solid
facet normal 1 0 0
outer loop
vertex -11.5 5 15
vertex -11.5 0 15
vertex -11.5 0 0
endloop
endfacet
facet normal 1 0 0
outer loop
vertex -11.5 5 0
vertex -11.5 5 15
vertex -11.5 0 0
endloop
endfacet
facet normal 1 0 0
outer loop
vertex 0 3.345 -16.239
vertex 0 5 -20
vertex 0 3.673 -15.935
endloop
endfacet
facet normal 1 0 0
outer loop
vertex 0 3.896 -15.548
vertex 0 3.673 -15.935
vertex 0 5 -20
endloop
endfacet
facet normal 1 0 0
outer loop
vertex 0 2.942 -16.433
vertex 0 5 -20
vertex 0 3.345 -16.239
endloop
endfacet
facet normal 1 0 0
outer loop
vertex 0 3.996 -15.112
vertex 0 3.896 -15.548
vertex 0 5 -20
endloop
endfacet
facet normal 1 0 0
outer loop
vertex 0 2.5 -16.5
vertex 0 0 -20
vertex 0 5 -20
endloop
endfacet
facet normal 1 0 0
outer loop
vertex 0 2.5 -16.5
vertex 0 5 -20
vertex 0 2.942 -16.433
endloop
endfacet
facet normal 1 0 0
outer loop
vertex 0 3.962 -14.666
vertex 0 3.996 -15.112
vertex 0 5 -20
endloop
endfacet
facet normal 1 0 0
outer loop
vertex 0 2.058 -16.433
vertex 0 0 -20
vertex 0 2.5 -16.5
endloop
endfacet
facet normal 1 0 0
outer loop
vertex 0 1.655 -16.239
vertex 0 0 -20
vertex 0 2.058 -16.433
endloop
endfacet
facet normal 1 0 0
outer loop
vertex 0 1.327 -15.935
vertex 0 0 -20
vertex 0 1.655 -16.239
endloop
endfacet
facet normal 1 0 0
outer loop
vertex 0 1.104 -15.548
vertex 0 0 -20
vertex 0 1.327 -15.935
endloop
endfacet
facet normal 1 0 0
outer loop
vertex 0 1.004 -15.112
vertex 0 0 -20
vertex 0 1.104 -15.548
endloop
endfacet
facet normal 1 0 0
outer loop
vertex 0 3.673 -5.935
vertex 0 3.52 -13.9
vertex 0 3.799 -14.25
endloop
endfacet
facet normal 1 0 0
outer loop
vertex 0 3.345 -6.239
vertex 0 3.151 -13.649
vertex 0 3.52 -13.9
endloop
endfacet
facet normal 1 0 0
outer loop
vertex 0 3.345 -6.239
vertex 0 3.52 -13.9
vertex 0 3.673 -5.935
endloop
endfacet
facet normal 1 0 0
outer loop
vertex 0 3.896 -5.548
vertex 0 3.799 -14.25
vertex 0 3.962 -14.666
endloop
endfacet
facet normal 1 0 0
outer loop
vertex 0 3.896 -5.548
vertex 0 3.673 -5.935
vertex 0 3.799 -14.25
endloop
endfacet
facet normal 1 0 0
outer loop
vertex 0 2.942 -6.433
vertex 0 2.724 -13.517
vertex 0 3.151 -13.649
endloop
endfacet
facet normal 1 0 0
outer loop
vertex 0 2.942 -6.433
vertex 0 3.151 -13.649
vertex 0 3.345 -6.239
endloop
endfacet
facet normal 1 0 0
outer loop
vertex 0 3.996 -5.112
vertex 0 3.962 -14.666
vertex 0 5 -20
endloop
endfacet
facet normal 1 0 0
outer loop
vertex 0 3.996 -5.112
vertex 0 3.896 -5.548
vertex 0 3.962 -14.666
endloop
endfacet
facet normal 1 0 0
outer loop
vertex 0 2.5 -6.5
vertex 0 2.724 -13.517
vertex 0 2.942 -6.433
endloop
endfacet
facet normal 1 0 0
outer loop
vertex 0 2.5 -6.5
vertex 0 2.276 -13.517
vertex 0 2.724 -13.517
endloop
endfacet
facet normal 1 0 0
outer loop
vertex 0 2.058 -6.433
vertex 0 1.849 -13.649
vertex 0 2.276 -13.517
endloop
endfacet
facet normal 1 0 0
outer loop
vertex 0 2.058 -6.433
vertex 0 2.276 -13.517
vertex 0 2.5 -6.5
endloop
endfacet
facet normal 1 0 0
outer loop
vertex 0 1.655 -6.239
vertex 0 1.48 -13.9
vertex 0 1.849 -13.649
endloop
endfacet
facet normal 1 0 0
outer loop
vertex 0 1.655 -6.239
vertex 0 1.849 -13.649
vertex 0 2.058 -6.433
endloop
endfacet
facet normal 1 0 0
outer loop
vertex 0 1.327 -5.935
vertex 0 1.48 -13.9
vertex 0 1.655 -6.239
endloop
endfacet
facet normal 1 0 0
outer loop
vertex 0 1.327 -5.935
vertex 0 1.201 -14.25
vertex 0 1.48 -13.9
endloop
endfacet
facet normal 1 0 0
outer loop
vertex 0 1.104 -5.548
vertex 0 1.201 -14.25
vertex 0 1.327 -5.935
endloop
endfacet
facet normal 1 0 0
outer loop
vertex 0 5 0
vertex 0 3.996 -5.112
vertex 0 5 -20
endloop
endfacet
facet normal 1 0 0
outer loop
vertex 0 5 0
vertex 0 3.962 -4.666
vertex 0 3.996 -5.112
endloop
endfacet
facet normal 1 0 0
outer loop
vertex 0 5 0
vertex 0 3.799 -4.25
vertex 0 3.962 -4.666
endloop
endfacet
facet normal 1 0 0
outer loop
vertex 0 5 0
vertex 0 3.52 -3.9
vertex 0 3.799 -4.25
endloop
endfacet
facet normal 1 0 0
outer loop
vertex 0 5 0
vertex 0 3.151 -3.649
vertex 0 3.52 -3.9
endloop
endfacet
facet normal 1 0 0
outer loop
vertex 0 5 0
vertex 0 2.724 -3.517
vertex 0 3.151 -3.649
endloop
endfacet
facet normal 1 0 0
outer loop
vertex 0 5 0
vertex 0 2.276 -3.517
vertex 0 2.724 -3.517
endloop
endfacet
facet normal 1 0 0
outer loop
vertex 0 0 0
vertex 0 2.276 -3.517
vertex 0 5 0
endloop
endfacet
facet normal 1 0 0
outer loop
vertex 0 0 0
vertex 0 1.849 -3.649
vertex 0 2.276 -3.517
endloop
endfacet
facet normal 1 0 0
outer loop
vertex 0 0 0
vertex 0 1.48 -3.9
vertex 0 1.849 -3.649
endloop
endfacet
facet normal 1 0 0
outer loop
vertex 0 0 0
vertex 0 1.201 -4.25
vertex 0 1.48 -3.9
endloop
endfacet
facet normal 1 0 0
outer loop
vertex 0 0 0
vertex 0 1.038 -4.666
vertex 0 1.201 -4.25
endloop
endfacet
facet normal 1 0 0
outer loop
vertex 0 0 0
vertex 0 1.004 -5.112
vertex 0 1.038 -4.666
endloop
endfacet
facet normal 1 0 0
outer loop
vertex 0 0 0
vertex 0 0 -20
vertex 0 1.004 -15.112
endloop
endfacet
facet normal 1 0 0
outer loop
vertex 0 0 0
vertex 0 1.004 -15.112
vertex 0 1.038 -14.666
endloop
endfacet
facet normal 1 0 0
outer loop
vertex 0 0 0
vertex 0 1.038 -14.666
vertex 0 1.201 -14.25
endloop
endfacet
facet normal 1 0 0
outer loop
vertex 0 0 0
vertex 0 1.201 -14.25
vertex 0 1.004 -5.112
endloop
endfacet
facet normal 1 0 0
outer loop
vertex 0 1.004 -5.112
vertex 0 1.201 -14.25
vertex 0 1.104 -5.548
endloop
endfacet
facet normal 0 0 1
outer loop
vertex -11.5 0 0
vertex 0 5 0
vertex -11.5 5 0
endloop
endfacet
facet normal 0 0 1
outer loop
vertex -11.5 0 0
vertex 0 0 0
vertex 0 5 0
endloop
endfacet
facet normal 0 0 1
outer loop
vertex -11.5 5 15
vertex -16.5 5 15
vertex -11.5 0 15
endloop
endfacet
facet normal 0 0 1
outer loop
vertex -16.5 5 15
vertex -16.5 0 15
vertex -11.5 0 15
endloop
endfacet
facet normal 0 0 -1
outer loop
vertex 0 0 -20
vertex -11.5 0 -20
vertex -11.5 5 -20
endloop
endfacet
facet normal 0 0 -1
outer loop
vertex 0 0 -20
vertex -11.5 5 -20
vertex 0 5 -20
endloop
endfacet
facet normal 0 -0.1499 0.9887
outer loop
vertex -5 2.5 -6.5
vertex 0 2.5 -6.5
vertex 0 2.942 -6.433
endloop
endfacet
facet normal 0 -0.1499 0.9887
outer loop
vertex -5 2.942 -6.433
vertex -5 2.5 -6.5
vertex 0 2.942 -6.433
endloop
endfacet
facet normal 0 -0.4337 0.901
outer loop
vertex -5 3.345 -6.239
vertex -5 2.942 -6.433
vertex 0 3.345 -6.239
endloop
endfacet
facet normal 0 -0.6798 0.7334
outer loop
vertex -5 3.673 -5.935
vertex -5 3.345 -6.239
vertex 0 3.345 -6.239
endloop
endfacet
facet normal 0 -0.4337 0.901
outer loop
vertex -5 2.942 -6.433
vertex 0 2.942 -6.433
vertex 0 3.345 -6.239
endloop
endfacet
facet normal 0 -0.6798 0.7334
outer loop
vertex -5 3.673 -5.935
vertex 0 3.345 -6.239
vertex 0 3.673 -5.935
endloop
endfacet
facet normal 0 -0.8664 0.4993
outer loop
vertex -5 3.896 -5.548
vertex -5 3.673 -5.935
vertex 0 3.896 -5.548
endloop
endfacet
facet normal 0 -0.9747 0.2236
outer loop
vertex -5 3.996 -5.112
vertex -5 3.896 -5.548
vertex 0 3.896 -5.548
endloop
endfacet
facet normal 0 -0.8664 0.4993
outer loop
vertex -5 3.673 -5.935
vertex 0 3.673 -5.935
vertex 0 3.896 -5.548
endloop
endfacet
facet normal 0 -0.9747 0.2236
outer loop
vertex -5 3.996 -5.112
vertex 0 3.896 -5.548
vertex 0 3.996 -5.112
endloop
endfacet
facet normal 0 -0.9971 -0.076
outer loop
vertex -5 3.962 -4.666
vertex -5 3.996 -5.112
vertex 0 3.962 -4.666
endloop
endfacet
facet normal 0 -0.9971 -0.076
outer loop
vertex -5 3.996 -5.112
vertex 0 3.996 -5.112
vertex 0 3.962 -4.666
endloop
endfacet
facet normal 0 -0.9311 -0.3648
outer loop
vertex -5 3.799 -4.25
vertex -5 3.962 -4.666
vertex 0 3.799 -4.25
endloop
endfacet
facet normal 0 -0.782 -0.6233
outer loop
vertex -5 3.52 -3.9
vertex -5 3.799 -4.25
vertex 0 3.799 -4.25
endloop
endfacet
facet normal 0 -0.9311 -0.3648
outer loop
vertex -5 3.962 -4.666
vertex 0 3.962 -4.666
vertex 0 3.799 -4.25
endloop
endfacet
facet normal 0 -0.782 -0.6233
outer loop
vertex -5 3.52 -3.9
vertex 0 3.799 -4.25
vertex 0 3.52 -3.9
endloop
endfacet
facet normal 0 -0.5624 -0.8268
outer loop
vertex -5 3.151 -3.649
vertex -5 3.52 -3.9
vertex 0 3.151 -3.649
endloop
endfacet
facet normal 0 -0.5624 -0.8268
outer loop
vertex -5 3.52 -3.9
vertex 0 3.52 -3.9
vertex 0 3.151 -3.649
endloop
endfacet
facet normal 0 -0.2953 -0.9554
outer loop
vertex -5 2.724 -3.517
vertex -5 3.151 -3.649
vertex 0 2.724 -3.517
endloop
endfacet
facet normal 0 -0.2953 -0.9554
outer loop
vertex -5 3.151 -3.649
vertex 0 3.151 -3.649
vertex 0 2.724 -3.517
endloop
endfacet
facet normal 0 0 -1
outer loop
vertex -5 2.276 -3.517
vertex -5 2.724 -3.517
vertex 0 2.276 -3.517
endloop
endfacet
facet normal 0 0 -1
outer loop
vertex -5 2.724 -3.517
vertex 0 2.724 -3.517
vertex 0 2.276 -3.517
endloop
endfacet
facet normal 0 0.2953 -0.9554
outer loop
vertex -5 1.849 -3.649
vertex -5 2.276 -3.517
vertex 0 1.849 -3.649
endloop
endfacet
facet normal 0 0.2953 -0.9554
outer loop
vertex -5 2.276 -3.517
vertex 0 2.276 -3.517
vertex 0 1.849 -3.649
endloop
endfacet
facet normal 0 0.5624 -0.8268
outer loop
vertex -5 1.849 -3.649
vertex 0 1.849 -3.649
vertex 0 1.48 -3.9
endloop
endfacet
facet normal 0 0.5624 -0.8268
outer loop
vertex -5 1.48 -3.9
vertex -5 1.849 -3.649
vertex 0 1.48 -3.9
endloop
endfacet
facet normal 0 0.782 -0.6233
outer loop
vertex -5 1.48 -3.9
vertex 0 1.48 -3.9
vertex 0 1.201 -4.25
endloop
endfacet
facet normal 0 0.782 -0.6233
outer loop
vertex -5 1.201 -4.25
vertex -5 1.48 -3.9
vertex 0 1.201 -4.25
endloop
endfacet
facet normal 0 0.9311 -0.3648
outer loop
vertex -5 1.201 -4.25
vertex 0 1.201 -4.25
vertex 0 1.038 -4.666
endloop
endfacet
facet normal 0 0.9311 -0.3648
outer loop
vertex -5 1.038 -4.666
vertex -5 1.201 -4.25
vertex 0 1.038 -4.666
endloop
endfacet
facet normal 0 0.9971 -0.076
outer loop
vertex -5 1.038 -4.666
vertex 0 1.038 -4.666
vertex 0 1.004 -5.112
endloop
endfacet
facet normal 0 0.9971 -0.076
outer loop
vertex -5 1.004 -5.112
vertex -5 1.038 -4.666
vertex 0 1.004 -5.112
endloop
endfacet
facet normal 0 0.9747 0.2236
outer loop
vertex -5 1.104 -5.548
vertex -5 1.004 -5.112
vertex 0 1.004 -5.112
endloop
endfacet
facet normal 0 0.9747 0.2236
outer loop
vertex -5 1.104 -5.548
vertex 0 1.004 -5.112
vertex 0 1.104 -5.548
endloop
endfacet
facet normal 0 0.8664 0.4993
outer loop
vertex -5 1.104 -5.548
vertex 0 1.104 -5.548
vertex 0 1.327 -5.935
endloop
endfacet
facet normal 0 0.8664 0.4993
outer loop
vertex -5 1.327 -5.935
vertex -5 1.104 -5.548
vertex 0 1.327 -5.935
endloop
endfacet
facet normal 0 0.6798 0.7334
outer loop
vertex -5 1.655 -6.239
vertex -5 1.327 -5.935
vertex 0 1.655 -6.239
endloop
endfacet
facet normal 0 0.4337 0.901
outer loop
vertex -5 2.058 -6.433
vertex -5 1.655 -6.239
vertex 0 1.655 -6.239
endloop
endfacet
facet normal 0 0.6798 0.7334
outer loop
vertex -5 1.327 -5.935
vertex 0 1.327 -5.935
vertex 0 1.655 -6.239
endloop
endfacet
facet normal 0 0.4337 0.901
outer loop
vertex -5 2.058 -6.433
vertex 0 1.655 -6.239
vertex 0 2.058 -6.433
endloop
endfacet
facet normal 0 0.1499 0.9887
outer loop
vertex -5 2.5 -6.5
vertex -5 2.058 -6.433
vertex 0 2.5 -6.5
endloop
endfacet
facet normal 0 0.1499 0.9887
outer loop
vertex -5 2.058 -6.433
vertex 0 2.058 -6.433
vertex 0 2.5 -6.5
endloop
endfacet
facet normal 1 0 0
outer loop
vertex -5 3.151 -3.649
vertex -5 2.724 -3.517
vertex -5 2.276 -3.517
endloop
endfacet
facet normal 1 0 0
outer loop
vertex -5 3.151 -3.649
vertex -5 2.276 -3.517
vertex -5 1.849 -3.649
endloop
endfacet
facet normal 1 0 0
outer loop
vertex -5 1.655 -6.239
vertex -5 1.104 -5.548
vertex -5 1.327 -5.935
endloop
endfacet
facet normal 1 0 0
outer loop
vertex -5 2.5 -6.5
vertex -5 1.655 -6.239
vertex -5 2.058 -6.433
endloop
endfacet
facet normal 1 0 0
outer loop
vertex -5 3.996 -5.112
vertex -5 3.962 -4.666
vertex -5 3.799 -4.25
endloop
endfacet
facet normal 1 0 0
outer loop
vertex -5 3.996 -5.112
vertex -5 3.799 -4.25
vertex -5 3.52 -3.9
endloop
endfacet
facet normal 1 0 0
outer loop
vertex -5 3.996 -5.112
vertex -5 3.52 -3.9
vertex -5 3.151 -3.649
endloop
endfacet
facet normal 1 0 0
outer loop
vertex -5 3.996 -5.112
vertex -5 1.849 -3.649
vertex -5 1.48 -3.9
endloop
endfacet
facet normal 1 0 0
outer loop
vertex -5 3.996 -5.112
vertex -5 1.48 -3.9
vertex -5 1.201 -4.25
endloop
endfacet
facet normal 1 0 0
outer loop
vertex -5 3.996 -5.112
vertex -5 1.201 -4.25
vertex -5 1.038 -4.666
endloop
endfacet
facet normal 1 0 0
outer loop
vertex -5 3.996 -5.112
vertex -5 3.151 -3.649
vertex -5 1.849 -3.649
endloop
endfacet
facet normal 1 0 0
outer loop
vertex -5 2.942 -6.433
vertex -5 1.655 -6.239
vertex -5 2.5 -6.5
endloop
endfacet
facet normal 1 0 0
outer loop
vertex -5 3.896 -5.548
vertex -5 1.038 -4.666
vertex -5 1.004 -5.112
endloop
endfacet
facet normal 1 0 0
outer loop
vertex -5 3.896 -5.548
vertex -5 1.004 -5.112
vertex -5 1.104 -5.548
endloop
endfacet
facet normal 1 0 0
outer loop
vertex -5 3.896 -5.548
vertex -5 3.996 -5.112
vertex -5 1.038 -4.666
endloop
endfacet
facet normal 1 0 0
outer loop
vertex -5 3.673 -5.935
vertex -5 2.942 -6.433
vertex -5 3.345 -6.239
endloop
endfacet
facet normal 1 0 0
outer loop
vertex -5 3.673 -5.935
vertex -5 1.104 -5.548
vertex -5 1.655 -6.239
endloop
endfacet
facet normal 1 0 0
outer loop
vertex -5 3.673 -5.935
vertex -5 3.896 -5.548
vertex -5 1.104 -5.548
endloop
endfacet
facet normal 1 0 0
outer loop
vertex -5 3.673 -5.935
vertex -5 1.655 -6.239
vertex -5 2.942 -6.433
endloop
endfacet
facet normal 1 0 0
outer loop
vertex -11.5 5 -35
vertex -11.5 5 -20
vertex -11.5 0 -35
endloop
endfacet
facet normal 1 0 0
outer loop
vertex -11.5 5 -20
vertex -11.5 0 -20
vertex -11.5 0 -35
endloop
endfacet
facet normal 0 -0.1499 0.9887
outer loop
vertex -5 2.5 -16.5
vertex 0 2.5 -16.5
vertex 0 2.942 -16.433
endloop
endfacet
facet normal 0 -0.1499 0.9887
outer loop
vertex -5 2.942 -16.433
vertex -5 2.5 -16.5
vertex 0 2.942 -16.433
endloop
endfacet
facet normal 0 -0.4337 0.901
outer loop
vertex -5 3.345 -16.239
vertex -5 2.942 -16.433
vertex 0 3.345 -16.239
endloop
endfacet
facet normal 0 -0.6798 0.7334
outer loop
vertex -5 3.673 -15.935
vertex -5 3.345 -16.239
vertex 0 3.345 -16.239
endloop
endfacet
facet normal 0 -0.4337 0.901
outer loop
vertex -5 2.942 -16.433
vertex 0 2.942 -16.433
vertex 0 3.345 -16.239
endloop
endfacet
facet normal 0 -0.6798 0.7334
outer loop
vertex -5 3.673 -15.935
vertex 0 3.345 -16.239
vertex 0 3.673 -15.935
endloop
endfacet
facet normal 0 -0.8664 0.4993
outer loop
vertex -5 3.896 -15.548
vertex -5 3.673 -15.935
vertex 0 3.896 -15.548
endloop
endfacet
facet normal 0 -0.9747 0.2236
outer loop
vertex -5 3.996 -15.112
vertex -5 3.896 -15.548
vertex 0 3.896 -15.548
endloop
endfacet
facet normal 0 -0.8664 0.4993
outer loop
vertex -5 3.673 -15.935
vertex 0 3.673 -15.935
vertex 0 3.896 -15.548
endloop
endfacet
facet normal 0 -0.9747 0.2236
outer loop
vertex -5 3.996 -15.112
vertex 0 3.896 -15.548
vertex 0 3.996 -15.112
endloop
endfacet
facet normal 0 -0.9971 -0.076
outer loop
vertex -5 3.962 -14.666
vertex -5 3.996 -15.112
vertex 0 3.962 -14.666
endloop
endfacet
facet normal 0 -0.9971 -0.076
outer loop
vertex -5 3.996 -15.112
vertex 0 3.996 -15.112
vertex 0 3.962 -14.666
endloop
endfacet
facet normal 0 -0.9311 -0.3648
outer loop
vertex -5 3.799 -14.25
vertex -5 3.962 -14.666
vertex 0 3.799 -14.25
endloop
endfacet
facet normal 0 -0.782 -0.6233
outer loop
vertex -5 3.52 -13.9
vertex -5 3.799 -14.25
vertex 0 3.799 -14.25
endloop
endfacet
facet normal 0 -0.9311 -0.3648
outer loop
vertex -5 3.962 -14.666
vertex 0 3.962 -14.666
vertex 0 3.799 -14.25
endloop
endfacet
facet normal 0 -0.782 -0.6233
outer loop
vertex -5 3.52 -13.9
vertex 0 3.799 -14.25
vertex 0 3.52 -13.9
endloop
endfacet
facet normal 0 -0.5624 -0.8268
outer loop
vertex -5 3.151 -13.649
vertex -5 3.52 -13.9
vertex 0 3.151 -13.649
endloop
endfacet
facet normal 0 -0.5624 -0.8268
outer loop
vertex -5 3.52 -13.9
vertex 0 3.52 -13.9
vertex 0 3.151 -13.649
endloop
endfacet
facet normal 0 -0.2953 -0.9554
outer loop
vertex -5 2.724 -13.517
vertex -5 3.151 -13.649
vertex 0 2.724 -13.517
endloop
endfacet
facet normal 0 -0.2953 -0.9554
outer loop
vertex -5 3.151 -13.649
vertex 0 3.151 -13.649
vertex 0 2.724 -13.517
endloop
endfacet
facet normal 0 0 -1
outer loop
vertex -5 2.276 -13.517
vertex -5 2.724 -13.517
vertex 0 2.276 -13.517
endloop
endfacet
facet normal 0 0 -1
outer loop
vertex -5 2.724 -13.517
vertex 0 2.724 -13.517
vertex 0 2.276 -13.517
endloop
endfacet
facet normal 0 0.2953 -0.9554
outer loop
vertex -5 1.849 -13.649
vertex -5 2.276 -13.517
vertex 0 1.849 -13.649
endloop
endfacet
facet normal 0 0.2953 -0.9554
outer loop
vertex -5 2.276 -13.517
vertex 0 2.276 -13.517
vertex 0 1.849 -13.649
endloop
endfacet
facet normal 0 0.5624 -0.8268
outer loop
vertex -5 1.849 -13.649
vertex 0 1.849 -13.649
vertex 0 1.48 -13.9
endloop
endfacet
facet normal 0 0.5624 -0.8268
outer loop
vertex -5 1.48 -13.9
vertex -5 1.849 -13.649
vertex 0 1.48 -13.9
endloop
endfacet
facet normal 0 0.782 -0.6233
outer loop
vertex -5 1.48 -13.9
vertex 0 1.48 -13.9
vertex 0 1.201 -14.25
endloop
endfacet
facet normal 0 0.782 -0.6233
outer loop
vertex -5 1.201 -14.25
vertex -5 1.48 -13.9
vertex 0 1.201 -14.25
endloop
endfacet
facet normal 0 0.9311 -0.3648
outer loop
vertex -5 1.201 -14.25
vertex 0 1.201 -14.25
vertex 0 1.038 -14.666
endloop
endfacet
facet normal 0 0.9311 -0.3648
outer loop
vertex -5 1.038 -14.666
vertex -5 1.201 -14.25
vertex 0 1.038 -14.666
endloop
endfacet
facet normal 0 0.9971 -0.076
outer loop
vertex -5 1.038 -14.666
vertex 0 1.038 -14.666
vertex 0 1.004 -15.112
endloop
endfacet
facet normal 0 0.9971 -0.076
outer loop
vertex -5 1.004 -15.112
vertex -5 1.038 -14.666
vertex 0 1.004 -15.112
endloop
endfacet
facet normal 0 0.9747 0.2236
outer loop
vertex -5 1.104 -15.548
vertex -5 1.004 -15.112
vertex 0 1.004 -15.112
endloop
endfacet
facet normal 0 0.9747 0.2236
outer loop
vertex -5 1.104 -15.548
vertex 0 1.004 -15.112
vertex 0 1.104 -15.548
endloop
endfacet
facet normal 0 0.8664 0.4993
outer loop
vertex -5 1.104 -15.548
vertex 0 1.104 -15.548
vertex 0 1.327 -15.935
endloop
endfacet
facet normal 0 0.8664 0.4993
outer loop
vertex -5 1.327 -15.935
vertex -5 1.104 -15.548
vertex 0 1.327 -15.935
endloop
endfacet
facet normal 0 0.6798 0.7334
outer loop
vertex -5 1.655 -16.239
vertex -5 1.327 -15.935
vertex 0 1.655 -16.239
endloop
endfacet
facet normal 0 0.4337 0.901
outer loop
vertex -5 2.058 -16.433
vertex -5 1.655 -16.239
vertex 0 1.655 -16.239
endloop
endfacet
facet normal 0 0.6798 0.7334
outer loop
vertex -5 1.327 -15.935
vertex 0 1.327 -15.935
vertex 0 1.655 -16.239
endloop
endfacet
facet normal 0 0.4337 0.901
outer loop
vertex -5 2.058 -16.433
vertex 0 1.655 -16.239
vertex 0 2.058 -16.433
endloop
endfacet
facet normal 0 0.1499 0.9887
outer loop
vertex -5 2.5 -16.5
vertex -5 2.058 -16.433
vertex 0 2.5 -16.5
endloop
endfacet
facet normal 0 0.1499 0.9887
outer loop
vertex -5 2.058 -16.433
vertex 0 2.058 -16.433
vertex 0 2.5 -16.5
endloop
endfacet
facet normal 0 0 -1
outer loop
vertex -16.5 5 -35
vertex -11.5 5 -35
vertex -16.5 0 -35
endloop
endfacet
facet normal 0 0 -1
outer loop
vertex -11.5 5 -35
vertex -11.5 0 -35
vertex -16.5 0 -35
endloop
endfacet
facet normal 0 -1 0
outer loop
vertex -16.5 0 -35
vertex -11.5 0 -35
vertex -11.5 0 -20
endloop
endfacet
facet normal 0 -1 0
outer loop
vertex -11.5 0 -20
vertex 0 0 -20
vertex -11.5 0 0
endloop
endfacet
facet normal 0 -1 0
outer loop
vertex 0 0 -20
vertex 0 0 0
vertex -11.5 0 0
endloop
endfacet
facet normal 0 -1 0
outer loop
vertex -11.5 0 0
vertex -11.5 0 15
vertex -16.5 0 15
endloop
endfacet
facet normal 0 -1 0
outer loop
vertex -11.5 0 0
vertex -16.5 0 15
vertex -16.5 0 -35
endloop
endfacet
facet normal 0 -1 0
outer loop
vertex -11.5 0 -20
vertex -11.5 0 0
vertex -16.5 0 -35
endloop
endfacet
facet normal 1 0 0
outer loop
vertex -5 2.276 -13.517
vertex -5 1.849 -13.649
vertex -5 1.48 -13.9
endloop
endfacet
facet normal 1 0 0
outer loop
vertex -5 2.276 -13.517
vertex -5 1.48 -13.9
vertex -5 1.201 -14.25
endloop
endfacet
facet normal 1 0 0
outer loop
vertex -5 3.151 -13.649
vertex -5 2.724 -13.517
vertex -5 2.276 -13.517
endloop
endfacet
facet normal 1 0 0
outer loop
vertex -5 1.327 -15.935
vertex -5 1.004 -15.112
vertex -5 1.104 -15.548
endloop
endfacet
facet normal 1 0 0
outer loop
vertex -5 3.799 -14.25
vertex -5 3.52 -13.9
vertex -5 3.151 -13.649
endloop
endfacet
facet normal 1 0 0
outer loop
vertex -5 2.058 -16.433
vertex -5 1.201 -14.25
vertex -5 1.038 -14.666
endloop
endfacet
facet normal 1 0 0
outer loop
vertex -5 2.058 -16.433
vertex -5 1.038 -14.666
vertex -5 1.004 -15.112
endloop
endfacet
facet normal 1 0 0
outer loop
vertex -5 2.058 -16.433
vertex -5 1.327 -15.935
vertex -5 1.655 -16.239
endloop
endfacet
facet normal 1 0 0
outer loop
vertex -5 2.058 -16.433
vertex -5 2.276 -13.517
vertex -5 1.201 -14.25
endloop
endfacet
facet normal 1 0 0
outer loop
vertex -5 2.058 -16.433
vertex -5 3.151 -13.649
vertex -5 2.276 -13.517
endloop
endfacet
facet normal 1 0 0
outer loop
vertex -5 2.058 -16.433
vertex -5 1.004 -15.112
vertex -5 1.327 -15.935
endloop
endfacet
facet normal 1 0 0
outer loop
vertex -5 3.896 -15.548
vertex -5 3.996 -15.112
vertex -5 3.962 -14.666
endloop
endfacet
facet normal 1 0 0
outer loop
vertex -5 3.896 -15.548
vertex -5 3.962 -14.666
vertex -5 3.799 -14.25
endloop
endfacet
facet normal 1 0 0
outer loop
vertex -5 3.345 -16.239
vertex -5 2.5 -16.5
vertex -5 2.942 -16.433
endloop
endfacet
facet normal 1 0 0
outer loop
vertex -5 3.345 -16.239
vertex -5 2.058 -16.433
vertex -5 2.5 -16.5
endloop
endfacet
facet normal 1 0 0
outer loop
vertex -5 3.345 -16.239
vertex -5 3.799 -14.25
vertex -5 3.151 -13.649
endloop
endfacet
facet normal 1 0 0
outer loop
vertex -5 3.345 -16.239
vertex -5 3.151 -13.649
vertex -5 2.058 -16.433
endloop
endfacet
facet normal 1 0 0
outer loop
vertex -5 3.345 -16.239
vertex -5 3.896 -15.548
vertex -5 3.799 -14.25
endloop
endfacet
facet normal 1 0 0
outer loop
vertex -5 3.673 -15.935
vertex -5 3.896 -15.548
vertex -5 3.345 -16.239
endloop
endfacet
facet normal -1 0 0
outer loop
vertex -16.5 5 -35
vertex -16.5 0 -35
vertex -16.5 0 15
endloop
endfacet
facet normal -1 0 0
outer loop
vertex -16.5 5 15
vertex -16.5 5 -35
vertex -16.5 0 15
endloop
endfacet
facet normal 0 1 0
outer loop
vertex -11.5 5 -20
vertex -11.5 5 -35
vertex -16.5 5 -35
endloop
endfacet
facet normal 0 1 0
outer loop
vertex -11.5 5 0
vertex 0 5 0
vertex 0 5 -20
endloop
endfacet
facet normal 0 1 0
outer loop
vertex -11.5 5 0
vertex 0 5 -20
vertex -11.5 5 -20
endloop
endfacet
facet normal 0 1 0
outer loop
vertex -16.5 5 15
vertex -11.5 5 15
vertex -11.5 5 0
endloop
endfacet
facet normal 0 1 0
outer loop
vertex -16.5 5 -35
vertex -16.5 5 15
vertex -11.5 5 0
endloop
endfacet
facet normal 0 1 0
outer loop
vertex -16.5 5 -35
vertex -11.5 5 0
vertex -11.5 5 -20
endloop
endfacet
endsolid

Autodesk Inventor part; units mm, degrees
ref_plane "YZ Plane" through (0, 0, 0) normal (1, 0, 0) x (0, 1, 0)
ref_plane "XZ Plane" through (0, 0, 0) normal (0, 1, 0) x (-1, 0, 0)
ref_plane "XY Plane" through (0, 0, 0) normal (0, 0, 1) x (1, 0, 0)
sketch "Esquisse1" plane through (0, 0, 0) normal (0, 1, 0) x (-1, 0, 0)
  line L0 (0, 0) -> (11.5, 0)
  line L1 (11.5, 0) -> (11.5, -20)
  line L2 (11.5, -20) -> (0, -20)
  line L3 (0, -20) -> (0, 0)
  line L4 (16.5, 15) -> (11.5, 15)
  line L5 (11.5, 15) -> (11.5, -35)
  line L6 (11.5, -35) -> (16.5, -35)
  line L7 (16.5, -35) -> (16.5, 15)
  point P0 (11.5, -10)
  dimension "d0" = 20
  dimension "d1" = 11.5
  dimension "d2" = 5
  dimension "d3" = 50
extrude "Extrusion1" add sketch "Esquisse1" along normal blind 5
sketch "Esquisse2" plane through (0, 0, 0) normal (1, 0, 0) x (0, 0, -1)
  line L0 (0, 0) -> (20, 0) construction
  line L1 (20, 0) -> (20, 5) construction
  line L2 (0, 5) -> (20, 5) construction
  line L3 (0, 0) -> (0, 5) construction
  line L4 (0, 0) -> (0, 5) construction
  line L5 (0, 2.5) -> (20, 2.5) construction
  circle A0 centre (5, 2.5) radius 1.5
  line L6 (10, 5) -> (10, 0) construction
  circle A1 centre (15, 2.5) radius 1.5
  dimension "d6" = 3
  dimension "d7" = 10
extrude "Extrusion2" cut sketch "Esquisse2" against normal blind 5
properties part number "tap_straight"
